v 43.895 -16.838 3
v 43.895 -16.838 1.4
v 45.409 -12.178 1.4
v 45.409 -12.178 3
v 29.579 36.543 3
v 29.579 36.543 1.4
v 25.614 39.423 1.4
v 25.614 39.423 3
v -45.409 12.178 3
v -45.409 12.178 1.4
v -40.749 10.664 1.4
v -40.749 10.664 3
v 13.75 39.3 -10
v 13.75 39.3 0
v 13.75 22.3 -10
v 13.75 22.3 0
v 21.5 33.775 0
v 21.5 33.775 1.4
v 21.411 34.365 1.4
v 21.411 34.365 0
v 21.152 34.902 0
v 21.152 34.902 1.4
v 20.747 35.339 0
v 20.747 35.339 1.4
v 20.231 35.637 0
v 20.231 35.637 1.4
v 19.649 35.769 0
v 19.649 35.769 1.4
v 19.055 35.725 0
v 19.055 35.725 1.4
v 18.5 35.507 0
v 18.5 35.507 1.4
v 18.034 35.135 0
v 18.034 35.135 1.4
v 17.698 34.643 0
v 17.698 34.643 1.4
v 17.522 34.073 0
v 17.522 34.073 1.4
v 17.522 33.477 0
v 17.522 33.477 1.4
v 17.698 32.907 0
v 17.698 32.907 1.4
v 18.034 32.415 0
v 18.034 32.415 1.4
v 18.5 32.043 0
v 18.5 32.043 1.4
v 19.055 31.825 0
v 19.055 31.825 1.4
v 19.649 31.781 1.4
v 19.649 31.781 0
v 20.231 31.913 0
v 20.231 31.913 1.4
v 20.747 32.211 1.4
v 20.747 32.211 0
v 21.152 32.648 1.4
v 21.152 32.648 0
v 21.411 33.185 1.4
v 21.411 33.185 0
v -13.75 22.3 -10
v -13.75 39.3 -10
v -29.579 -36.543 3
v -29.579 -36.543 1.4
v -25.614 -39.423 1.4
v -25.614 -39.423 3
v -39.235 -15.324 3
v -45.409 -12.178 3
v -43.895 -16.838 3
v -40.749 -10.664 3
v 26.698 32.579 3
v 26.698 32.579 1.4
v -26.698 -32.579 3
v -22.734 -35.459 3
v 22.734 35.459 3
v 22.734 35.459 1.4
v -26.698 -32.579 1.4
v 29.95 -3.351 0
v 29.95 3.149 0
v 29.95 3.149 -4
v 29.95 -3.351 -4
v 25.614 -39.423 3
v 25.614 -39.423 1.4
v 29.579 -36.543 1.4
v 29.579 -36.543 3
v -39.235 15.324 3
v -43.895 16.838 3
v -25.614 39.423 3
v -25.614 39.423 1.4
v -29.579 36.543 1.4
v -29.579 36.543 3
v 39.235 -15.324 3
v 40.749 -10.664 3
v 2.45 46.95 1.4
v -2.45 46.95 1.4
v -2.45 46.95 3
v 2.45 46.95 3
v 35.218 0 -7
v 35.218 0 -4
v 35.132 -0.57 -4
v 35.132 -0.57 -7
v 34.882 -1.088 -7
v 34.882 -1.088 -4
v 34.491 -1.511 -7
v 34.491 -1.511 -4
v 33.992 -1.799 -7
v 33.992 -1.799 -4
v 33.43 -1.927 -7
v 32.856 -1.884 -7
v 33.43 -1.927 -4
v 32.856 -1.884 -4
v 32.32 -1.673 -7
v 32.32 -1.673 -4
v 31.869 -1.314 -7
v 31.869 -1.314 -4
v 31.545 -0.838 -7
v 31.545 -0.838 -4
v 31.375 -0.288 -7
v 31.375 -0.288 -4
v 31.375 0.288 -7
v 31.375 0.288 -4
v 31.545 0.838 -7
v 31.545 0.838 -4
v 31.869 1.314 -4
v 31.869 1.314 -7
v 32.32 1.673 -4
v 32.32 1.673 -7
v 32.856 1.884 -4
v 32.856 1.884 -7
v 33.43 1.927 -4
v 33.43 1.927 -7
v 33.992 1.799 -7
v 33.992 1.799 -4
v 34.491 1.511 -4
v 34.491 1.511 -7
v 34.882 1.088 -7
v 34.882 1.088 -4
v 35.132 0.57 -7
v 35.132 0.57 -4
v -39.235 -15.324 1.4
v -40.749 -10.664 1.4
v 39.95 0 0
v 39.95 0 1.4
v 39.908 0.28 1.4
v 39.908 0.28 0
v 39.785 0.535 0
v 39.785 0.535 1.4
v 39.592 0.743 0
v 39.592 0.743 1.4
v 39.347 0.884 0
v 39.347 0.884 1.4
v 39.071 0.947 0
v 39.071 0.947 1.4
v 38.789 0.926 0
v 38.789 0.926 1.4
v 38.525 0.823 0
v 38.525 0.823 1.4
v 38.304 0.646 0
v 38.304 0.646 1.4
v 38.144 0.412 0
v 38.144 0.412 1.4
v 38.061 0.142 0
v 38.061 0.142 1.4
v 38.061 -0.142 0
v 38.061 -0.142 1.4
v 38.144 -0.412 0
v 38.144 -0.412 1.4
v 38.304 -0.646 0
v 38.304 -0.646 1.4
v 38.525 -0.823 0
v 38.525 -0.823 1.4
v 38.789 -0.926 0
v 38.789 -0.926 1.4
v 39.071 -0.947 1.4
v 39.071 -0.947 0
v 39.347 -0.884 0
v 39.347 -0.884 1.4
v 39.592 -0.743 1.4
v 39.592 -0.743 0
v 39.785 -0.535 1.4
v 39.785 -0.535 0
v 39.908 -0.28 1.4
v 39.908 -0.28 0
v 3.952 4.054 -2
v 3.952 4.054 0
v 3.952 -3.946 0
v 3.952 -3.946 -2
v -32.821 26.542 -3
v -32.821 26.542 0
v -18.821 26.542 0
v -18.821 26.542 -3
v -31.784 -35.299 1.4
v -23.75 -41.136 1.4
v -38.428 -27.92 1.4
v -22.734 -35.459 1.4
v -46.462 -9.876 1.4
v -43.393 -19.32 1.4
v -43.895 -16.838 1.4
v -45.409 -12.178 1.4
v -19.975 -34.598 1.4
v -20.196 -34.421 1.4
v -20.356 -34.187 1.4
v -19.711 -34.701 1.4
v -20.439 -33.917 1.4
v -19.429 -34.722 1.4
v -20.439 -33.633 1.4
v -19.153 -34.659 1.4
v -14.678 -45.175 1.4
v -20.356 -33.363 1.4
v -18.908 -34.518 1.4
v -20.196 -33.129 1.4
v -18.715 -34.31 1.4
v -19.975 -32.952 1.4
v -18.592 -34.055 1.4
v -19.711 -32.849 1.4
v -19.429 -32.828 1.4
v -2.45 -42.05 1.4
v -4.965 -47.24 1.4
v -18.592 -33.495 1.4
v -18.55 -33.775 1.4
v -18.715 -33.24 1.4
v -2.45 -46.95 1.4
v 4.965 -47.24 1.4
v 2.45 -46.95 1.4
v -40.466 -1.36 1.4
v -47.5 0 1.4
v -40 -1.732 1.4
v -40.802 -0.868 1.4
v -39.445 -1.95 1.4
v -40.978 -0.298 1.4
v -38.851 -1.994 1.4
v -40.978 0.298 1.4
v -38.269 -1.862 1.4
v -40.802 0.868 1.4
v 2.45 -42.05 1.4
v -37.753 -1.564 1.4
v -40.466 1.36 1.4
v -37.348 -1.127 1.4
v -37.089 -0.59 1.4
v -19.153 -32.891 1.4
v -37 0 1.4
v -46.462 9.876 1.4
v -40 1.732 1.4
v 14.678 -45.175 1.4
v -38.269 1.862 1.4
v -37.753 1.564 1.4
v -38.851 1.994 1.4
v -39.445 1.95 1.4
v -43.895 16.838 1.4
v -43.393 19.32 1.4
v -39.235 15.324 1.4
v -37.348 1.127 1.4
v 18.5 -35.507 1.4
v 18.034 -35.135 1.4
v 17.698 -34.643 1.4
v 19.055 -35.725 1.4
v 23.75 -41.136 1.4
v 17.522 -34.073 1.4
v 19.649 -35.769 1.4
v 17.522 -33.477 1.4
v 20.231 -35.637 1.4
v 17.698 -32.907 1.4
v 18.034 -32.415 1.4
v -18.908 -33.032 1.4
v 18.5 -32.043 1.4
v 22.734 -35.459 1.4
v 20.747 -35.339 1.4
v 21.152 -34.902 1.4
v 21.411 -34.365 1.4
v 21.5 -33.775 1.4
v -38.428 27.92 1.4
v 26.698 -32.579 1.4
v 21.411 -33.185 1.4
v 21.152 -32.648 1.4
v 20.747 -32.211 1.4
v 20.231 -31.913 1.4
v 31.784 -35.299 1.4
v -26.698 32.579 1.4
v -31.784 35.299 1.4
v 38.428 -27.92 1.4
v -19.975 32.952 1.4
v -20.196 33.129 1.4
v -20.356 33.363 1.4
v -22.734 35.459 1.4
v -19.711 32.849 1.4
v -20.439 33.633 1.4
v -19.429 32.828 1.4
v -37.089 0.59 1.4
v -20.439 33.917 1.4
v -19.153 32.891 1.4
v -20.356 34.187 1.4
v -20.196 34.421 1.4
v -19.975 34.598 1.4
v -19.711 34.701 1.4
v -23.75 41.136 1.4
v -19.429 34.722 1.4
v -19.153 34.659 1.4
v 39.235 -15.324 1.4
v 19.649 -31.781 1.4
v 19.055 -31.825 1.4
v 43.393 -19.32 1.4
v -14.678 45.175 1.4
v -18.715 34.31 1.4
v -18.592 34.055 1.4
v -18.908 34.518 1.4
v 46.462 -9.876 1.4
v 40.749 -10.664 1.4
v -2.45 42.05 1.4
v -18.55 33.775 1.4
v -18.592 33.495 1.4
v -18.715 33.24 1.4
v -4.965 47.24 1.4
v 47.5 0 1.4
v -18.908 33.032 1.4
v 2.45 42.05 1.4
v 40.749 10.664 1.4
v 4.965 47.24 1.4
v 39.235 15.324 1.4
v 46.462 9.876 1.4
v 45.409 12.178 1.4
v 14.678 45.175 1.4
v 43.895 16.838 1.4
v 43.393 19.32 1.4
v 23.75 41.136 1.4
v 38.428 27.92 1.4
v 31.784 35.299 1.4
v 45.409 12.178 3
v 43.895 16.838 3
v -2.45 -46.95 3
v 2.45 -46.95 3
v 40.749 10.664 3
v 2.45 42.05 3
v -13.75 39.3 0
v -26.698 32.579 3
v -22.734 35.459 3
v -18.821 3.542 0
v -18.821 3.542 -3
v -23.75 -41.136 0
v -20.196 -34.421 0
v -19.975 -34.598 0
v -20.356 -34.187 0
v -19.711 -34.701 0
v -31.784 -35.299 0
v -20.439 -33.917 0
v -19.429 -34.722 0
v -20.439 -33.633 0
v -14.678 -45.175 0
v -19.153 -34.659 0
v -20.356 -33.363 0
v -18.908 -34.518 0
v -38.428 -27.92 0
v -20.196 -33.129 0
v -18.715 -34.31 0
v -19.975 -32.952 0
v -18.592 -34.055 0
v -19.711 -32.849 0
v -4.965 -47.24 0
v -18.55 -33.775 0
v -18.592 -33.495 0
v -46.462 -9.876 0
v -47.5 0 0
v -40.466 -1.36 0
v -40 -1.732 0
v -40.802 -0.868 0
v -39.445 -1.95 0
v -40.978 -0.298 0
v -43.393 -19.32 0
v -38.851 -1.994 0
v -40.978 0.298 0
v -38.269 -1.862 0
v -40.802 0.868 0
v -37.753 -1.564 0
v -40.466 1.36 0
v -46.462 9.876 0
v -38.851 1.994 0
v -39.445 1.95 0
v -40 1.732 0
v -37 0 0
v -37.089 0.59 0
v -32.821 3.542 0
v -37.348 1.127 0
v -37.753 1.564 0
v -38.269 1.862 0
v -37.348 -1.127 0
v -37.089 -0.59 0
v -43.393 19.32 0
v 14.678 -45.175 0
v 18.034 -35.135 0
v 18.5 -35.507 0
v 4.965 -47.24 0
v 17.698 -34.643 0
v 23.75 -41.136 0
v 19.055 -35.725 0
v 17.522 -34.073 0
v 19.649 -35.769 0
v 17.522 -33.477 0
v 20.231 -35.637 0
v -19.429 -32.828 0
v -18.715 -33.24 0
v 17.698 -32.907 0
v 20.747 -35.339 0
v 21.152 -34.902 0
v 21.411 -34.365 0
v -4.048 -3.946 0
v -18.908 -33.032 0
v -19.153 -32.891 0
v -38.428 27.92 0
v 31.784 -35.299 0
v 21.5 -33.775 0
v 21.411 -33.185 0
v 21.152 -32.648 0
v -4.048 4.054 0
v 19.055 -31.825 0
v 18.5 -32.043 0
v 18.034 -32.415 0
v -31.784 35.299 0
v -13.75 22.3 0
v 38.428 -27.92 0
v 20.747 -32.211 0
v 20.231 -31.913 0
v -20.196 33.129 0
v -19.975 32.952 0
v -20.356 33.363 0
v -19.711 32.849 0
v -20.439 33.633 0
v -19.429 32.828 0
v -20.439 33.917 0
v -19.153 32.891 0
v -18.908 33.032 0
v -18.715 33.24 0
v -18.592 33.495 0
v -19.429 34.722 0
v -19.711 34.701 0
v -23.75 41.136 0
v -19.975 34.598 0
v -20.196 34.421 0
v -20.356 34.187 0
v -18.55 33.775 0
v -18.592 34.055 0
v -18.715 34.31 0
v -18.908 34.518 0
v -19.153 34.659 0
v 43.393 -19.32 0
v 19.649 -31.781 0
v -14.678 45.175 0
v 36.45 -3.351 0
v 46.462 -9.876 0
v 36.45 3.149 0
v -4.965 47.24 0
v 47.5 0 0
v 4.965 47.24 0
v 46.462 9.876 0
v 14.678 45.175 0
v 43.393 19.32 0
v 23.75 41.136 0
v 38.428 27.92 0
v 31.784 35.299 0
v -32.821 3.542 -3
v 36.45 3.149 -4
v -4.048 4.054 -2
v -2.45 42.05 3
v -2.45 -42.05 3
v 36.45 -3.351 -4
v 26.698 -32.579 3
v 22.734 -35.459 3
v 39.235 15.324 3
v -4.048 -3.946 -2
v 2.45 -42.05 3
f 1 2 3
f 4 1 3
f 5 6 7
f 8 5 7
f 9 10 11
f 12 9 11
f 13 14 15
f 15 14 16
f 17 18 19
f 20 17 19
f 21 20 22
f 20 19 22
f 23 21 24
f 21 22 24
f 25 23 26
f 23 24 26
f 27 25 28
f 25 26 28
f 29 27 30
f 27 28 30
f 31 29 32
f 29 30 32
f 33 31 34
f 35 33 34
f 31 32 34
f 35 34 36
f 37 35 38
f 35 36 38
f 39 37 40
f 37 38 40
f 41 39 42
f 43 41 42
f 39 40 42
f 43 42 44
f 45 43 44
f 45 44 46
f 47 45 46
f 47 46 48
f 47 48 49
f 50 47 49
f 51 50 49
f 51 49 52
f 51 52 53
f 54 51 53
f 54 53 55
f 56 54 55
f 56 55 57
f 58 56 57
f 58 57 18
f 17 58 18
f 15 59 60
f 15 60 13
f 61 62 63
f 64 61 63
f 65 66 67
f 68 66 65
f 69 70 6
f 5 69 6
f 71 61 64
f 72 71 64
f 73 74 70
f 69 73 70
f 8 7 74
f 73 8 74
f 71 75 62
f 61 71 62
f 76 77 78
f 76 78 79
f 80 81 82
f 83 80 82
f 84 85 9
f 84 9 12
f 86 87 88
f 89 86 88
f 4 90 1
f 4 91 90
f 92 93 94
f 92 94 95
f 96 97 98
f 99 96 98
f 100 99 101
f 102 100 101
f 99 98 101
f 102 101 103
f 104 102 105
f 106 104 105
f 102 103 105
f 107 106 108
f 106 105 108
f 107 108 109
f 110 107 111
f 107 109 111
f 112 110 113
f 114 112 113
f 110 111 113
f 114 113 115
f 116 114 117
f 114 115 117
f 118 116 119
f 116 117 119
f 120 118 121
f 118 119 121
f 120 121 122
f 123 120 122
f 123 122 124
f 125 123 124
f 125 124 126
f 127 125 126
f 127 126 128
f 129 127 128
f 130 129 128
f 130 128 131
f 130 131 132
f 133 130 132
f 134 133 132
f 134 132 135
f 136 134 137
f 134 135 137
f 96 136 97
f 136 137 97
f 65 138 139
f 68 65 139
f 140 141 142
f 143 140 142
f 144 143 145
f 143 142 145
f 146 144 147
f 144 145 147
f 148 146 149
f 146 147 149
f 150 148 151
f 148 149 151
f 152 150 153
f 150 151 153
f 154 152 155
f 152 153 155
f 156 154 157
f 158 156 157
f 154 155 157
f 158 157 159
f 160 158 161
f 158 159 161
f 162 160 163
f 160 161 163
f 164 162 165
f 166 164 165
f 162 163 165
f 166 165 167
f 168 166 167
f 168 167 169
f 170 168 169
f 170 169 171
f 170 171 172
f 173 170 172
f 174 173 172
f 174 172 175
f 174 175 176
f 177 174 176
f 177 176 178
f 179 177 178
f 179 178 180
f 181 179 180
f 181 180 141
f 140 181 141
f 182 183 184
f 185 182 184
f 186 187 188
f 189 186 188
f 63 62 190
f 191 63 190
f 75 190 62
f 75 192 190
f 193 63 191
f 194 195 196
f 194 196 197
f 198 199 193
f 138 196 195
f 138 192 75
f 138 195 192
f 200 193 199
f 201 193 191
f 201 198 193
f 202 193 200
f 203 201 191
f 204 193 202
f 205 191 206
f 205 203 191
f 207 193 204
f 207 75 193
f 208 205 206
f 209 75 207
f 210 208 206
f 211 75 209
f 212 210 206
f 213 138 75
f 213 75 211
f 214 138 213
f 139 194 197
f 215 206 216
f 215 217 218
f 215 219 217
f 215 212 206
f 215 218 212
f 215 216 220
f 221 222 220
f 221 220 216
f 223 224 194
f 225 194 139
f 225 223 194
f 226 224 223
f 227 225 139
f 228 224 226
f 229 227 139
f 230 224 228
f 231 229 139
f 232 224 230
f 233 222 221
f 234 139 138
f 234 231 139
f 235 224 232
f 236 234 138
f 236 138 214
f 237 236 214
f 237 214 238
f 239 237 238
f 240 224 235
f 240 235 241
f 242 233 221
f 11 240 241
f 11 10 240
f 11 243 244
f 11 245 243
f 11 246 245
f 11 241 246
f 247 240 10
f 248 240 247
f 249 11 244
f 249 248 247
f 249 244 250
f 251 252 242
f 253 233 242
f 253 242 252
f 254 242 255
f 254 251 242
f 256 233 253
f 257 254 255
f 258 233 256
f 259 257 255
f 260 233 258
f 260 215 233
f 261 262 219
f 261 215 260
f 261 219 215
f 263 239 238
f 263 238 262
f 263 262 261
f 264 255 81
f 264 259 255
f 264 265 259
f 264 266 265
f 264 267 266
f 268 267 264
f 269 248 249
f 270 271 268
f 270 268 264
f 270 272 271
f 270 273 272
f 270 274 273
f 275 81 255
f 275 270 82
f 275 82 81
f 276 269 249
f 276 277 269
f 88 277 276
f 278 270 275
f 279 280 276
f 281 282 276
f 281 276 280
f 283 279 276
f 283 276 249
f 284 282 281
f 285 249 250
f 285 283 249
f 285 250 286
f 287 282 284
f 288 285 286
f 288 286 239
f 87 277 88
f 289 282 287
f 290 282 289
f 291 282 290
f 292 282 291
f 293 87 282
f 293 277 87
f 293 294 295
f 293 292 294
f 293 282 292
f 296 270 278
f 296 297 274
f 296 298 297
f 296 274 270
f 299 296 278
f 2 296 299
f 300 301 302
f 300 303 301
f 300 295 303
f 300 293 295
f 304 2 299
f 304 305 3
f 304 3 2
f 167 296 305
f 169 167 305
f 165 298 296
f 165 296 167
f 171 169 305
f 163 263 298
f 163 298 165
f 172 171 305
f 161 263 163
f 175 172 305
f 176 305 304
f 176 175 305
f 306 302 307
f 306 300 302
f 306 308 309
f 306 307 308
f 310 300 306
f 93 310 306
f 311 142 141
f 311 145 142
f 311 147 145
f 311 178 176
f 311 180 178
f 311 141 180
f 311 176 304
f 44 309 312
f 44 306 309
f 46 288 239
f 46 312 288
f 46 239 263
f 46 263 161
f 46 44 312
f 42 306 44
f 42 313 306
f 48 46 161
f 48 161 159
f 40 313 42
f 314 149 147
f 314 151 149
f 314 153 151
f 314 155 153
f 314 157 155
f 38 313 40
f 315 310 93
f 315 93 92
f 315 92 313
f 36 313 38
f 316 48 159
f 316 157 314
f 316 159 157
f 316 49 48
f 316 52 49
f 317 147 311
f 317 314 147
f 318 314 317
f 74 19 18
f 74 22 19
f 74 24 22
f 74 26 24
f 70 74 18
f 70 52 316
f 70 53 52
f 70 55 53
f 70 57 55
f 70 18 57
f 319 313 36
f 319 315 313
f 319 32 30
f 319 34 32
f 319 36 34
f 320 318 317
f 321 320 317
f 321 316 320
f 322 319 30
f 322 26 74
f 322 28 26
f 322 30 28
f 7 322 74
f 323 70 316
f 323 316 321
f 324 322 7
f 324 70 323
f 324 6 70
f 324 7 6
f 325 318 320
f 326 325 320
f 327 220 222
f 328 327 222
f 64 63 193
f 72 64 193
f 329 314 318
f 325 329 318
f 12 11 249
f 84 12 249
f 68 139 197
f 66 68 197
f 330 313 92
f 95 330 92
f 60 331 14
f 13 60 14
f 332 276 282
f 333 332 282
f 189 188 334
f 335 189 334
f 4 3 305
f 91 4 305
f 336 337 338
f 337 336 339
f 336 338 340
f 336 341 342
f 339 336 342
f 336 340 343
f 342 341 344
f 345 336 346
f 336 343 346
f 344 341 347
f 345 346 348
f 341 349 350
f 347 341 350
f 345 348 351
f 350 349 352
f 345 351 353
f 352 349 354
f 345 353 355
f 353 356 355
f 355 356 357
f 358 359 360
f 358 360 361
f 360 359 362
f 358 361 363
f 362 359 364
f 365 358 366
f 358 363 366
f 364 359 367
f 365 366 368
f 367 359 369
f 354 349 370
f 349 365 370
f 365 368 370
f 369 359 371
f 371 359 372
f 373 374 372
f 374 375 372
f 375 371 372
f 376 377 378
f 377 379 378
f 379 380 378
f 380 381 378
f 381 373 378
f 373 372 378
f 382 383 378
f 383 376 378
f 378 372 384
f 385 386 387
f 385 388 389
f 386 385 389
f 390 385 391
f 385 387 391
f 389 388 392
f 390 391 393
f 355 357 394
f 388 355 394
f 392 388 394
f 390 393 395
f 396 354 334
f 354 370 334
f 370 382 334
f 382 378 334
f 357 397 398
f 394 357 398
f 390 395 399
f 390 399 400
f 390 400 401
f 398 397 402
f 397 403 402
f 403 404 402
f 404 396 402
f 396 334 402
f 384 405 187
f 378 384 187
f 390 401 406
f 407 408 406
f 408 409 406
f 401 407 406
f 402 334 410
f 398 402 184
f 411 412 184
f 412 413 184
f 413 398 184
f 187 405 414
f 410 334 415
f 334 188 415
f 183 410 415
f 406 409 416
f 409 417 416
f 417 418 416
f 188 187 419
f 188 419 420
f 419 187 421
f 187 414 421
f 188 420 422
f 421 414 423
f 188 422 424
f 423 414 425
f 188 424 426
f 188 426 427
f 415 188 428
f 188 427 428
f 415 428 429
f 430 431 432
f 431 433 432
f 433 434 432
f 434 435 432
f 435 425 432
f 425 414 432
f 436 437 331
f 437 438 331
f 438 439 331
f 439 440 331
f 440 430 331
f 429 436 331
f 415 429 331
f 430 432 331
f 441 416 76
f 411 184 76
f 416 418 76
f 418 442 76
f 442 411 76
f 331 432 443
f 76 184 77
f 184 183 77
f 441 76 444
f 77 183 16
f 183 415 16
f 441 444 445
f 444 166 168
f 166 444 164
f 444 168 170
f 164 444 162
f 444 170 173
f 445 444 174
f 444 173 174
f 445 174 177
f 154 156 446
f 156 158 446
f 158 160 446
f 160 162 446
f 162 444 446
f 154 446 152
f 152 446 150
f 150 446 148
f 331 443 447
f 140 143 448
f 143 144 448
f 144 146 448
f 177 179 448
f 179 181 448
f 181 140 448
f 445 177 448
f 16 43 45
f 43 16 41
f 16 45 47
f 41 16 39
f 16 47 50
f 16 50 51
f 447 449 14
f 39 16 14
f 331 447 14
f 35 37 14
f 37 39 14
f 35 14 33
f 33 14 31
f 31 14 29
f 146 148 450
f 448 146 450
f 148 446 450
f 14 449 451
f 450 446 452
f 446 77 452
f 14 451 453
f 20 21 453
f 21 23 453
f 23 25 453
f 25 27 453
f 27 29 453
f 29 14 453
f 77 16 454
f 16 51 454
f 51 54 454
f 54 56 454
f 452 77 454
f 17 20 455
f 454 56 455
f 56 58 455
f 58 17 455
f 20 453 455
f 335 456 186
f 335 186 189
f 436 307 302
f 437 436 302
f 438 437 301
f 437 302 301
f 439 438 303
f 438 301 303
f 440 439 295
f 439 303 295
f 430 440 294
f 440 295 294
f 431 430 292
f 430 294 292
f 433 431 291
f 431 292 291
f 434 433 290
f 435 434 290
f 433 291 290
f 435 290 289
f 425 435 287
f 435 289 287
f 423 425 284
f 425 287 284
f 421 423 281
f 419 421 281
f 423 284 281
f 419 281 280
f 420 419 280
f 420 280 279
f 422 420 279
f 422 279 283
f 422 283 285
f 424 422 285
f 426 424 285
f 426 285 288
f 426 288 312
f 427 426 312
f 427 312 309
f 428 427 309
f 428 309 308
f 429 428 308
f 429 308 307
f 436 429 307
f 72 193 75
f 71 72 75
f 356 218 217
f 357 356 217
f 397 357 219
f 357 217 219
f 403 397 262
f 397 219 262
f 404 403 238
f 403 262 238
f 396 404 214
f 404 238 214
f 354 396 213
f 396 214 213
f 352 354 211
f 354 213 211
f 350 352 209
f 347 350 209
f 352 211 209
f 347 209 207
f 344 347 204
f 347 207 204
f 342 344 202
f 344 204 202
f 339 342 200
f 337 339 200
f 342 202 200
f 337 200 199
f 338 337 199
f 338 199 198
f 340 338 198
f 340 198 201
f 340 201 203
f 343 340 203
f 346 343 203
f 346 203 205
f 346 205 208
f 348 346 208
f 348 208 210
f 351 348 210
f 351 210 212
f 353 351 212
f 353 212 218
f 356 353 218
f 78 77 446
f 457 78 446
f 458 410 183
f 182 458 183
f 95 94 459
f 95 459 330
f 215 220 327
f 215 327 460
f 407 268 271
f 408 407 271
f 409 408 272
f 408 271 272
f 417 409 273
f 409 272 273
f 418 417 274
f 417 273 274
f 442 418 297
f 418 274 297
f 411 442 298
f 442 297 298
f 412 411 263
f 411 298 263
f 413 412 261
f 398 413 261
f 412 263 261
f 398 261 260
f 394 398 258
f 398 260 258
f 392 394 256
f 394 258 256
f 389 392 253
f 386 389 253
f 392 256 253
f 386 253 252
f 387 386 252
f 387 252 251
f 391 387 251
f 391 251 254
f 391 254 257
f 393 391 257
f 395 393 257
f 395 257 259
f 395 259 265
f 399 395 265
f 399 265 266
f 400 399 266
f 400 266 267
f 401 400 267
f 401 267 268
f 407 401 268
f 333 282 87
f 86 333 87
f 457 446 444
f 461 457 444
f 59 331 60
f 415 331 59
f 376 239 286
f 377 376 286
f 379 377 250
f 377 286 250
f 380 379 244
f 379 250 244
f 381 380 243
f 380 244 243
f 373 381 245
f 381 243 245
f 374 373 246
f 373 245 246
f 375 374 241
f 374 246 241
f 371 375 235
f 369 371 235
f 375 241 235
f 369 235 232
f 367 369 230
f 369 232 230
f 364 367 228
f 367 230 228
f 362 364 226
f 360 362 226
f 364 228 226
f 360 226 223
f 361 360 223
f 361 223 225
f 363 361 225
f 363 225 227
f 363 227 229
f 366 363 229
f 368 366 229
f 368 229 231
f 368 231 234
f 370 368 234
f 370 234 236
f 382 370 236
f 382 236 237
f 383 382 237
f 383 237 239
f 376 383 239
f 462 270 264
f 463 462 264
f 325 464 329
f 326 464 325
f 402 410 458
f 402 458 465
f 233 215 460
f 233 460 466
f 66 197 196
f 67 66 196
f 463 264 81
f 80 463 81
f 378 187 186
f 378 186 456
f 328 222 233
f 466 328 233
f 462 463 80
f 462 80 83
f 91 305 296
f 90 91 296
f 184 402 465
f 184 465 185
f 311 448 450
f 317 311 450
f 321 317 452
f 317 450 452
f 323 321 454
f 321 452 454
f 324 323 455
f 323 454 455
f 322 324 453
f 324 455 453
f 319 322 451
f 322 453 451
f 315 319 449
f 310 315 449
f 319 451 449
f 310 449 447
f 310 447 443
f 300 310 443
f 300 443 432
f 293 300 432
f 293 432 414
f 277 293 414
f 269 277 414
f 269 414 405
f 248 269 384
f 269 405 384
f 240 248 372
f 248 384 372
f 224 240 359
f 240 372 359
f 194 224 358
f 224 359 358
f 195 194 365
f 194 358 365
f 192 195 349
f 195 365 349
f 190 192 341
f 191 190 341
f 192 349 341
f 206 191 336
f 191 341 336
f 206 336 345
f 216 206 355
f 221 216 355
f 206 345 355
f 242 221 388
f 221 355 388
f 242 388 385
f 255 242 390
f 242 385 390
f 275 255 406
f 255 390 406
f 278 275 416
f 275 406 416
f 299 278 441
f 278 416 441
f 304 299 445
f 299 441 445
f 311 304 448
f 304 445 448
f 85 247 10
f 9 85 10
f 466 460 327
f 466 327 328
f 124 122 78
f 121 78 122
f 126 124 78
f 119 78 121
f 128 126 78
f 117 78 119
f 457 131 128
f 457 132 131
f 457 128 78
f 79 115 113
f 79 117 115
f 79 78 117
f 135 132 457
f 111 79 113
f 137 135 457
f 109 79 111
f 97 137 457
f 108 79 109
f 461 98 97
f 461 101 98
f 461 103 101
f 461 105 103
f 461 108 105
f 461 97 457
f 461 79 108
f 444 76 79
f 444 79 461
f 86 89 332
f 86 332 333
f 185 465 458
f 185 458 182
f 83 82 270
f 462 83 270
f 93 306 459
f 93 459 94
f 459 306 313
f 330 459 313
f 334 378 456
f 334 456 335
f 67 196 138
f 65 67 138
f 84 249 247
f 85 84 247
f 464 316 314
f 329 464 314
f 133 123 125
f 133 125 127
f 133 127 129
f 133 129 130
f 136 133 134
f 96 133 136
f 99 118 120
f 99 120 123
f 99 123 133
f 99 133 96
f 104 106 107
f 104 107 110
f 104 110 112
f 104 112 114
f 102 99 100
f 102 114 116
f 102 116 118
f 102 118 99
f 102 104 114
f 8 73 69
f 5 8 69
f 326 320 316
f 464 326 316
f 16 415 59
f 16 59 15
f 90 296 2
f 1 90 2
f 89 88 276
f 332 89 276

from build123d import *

# Parameters (mm, degrees)
F0_R      = 47.5
F1_DEPTH  = 1.4
F3_W      = 4.9
F3_H      = 4.9
F4_DEPTH  = 1.6
F5_R      = 2
F5_R_2    = 0.95
F6_DEPTH  = 1.401
F7_W      = 27.5
F7_H      = 17
F8_DEPTH  = 10
F9_W      = 14
F9_H      = 23
F10_DEPTH = 3
F11_W     = 8
F11_H     = 8
F12_DEPTH = 2
F13_W     = 6.5
F13_H     = 6.5
F14_DEPTH = 4
F15_R     = 1.932213
F16_DEPTH = 3


with BuildPart() as f1:
    # F0 (on Top) → F1 (new body)
    with BuildSketch(Plane.XY):
        Circle(F0_R)
    extrude(amount=F1_DEPTH)

    # F3 (on face) → F4 (join)
    with BuildSketch(Plane.XY.offset(1.4)):
        with Locations((0, 44.5)):
            Rectangle(F3_W, F3_H)
        Polygon((-22.734278, 35.459238), (-25.614426, 39.423422), (-29.578609, 36.543274), (-26.698461, 32.579091), align=None)
        Polygon((-39.234835, 15.324253), (-43.895012, 16.838436), (-45.409195, 12.178259), (-40.749018, 10.664076), align=None)
        Polygon((-40.749018, -10.664076), (-45.409195, -12.178259), (-43.895012, -16.838436), (-39.234835, -15.324253), align=None)
        Polygon((-26.698461, -32.579091), (-29.578609, -36.543274), (-25.614426, -39.423422), (-22.734278, -35.459238), align=None)
        with Locations((0, -44.5)):
            Rectangle(F3_W, F3_H)
        Polygon((22.734278, -35.459238), (25.614426, -39.423422), (29.578609, -36.543274), (26.698461, -32.579091), align=None)
        Polygon((39.234835, -15.324253), (43.895012, -16.838436), (45.409195, -12.178259), (40.749018, -10.664076), align=None)
        Polygon((40.749018, 10.664076), (45.409195, 12.178259), (43.895012, 16.838436), (39.234835, 15.324253), align=None)
        Polygon((26.698461, 32.579091), (29.578609, 36.543274), (25.614426, 39.423422), (22.734278, 35.459238), align=None)
    extrude(amount=F4_DEPTH)

    # F5 (on face) → F6 (cut, through all)
    with BuildSketch(Plane.XY.offset(1.4)):
        with Locations((-39, 0)):
            Circle(F5_R)
        with Locations((19.5, -33.774991)):
            Circle(F5_R)
        with Locations((19.5, 33.774991)):
            Circle(F5_R)
        with Locations((39, 0)):
            Circle(F5_R_2)
        with Locations((-19.5, 33.774991)):
            Circle(F5_R_2)
        with Locations((-19.5, -33.774991)):
            Circle(F5_R_2)
    extrude(amount=-F6_DEPTH, mode=Mode.SUBTRACT)

    # F7 (on face) → F8 (join)
    with BuildSketch(Plane(origin=(0, 0, 0), x_dir=(1, 0, 0), z_dir=(0, 0, -1))):
        with Locations((0, -30.8)):
            Rectangle(F7_W, F7_H)
    extrude(amount=F8_DEPTH)

    # F9 (on face) → F10 (join)
    with BuildSketch(Plane(origin=(0, 0, 0), x_dir=(1, 0, 0), z_dir=(0, 0, -1))):
        with Locations((-25.821303, -15.041643)):
            Rectangle(F9_W, F9_H)
    extrude(amount=F10_DEPTH)

    # F11 (on face) → F12 (join)
    with BuildSketch(Plane(origin=(0, 0, 0), x_dir=(1, 0, 0), z_dir=(0, 0, -1))):
        with Locations((-0.047592, -0.053598)):
            Rectangle(F11_W, F11_H)
    extrude(amount=F12_DEPTH)

    # F13 (on face) → F14 (join)
    with BuildSketch(Plane(origin=(0, 0, 0), x_dir=(1, 0, 0), z_dir=(0, 0, -1))):
        with Locations((33.2, 0.101188)):
            Rectangle(F13_W, F13_H)
    extrude(amount=F14_DEPTH)

    # F15 (on face) → F16 (join)
    with BuildSketch(Plane(origin=(0, 0, -4), x_dir=(1, 0, 0), z_dir=(0, 0, -1))):
        with Locations((33.285893, 0)):
            Circle(F15_R)
    extrude(amount=F16_DEPTH)


solid = f1.part
